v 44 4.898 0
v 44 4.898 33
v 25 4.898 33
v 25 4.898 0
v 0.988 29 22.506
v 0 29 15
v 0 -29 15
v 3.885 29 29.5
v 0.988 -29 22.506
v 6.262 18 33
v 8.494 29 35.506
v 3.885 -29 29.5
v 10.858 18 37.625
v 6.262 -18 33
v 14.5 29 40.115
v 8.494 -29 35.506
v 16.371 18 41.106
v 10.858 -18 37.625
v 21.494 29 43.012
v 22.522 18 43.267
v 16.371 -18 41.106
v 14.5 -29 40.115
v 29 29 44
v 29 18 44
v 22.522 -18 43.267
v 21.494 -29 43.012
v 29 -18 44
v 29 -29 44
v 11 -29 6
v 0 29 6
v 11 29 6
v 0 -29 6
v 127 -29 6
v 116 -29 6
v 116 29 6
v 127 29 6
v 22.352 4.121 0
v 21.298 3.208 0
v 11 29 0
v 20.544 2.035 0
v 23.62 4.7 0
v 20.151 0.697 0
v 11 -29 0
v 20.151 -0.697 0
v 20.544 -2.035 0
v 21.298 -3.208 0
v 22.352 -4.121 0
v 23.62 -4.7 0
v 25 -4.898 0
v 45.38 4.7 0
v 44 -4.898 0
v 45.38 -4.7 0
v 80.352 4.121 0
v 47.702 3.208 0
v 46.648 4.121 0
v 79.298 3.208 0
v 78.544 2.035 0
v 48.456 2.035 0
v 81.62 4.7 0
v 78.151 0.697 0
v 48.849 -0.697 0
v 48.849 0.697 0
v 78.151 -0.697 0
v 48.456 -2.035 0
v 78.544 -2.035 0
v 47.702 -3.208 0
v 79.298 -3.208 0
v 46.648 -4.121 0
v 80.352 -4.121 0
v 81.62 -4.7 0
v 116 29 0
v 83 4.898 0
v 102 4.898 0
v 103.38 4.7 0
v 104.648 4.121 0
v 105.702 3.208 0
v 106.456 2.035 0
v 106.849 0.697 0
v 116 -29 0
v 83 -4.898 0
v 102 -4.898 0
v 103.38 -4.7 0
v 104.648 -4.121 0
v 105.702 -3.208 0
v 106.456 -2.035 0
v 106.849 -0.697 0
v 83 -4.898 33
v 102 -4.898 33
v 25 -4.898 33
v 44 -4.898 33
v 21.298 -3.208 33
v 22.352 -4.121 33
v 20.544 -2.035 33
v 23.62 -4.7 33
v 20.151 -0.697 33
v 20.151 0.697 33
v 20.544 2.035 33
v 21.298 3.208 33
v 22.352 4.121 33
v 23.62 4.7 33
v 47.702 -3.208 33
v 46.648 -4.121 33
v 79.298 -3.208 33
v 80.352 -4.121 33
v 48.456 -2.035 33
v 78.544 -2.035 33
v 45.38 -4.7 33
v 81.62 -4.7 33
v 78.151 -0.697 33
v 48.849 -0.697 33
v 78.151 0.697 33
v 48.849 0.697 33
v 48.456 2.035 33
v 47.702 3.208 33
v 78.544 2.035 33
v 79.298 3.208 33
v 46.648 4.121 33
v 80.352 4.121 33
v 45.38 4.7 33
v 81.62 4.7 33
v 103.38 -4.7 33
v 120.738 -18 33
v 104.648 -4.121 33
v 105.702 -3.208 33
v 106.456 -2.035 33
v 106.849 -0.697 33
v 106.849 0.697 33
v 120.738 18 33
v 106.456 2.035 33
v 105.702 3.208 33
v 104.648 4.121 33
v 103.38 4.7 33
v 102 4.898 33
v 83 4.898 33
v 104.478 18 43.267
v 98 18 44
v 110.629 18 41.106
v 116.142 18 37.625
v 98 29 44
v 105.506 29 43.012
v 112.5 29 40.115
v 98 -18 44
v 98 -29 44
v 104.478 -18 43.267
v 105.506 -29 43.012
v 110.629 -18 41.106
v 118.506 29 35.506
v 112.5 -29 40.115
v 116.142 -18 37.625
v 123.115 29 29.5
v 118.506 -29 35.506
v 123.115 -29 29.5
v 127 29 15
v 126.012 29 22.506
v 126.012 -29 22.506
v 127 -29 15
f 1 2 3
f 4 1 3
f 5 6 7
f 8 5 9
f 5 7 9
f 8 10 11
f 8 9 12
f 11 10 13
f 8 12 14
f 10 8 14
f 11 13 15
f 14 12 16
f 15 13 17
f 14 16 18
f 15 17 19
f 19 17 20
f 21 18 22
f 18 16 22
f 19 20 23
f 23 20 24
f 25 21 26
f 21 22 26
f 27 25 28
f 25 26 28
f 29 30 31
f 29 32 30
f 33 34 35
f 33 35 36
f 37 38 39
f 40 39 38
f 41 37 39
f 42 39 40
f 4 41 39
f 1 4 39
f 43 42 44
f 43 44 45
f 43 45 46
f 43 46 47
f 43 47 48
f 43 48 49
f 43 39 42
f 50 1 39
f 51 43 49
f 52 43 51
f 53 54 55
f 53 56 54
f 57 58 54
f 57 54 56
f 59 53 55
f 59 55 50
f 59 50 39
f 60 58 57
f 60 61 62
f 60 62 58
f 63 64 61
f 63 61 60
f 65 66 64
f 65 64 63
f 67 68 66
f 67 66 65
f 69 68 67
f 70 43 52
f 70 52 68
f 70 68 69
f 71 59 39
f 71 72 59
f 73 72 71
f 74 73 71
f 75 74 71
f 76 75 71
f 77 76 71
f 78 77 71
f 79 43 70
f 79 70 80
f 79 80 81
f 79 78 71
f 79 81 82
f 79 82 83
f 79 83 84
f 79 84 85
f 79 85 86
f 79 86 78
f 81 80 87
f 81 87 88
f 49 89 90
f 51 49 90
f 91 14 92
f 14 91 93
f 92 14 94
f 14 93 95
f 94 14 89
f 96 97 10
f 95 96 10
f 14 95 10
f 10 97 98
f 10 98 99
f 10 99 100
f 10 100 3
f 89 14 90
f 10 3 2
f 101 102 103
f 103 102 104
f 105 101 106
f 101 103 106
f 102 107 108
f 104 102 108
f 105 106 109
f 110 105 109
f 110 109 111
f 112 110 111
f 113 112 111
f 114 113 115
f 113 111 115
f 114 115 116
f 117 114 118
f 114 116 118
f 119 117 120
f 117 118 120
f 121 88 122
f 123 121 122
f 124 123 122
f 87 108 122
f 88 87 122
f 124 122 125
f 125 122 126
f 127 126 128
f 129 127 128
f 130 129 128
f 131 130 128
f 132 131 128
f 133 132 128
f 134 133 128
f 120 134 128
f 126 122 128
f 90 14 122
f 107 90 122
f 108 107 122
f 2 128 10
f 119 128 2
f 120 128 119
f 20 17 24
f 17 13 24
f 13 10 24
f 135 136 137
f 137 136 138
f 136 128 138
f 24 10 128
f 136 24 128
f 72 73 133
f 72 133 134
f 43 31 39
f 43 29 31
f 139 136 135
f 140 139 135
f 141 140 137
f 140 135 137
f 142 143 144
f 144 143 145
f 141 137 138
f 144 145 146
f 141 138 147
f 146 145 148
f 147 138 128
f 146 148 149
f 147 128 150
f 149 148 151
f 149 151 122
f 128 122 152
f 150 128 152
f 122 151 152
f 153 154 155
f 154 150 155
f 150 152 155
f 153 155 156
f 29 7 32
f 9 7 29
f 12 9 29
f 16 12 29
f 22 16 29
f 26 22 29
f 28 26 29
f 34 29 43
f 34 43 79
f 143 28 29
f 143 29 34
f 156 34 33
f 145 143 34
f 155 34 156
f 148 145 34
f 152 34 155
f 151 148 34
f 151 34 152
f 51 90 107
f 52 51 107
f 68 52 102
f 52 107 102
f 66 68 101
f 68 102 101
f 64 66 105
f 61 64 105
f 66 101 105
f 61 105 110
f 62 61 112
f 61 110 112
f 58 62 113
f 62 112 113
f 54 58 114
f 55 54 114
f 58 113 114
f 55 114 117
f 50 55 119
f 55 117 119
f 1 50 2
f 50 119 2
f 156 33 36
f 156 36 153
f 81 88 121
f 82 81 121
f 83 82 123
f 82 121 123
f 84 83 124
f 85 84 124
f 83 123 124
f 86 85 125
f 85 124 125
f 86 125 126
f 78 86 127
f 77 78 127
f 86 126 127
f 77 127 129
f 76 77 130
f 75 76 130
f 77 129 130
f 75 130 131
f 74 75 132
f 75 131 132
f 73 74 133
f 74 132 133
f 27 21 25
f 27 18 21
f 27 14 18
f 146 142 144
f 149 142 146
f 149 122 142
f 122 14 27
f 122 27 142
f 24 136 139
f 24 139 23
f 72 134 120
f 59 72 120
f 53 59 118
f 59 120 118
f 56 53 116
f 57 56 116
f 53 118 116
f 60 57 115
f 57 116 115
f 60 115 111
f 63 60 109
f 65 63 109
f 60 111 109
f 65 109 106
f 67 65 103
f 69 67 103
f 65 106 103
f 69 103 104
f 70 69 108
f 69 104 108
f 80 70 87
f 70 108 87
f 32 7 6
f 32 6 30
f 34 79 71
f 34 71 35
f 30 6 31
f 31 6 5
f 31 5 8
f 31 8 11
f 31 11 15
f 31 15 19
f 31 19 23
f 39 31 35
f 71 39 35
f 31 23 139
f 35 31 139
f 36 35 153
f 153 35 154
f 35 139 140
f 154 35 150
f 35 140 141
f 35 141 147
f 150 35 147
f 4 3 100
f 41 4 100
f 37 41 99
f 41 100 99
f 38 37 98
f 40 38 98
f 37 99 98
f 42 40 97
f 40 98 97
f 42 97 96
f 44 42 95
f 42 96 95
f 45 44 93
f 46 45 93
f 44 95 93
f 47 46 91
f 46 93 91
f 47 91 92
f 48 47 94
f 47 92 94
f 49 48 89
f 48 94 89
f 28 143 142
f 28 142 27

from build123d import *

# Parameters (mm, degrees)
F1_DEPTH = 29
F2_W     = 36
F2_H     = 11
F3_DEPTH = 127.001
F5_DEPTH = 58.001
F7_DEPTH = 58.001
F9_DEPTH = 33.001


with BuildPart() as f1:
    # F0 (on Front) → F1 (new body, symmetric)
    with BuildSketch(Plane.XZ):
        Polygon((11, 6), (11, 0), (116, 0), (116, 6), (127, 6), (127, 44), (0, 44), (0, 6), align=None)
    extrude(amount=F1_DEPTH, both=True)

    # F2 (on face) → F3 (cut, through all)
    with BuildSketch(Plane.YZ.offset(127)):
        with Locations((0, 38.5)):
            Rectangle(F2_W, F2_H)
    extrude(amount=-F3_DEPTH, mode=Mode.SUBTRACT)

    # F4 (on face) → F5 (cut, through all)
    with BuildSketch(Plane.XZ.offset(29)):
        with BuildLine():
            ThreePointArc((0, 15), (8.493903, 35.506097), (29, 44))
            Line((29, 44), (0, 44))
            Line((0, 44), (0, 15))
        make_face()
    extrude(amount=-F5_DEPTH, mode=Mode.SUBTRACT)

    # F6 (on face) → F7 (cut, through all)
    with BuildSketch(Plane.XZ.offset(29)):
        with BuildLine():
            ThreePointArc((98, 44), (118.506097, 35.506097), (127, 15))
            Line((127, 15), (127, 44))
            Line((127, 44), (98, 44))
        make_face()
    extrude(amount=-F7_DEPTH, mode=Mode.SUBTRACT)

    # F8 (on face) → F9 (cut, through all)
    with BuildSketch(Plane.XY.offset(33)):
        with BuildLine():
            Line((102, 4.898486), (83, 4.898486))
            ThreePointArc((83, 4.898486), (78.101514, 0), (83, -4.898486))
            Line((83, -4.898486), (102, -4.898486))
            ThreePointArc((102, -4.898486), (106.898486, 0), (102, 4.898486))
        make_face()
        with BuildLine():
            Line((44, 4.898486), (25, 4.898486))
            ThreePointArc((25, 4.898486), (20.101514, 0), (25, -4.898486))
            Line((25, -4.898486), (44, -4.898486))
            ThreePointArc((44, -4.898486), (48.898486, 0), (44, 4.898486))
        make_face()
    extrude(amount=-F9_DEPTH, mode=Mode.SUBTRACT)


solid = f1.part
